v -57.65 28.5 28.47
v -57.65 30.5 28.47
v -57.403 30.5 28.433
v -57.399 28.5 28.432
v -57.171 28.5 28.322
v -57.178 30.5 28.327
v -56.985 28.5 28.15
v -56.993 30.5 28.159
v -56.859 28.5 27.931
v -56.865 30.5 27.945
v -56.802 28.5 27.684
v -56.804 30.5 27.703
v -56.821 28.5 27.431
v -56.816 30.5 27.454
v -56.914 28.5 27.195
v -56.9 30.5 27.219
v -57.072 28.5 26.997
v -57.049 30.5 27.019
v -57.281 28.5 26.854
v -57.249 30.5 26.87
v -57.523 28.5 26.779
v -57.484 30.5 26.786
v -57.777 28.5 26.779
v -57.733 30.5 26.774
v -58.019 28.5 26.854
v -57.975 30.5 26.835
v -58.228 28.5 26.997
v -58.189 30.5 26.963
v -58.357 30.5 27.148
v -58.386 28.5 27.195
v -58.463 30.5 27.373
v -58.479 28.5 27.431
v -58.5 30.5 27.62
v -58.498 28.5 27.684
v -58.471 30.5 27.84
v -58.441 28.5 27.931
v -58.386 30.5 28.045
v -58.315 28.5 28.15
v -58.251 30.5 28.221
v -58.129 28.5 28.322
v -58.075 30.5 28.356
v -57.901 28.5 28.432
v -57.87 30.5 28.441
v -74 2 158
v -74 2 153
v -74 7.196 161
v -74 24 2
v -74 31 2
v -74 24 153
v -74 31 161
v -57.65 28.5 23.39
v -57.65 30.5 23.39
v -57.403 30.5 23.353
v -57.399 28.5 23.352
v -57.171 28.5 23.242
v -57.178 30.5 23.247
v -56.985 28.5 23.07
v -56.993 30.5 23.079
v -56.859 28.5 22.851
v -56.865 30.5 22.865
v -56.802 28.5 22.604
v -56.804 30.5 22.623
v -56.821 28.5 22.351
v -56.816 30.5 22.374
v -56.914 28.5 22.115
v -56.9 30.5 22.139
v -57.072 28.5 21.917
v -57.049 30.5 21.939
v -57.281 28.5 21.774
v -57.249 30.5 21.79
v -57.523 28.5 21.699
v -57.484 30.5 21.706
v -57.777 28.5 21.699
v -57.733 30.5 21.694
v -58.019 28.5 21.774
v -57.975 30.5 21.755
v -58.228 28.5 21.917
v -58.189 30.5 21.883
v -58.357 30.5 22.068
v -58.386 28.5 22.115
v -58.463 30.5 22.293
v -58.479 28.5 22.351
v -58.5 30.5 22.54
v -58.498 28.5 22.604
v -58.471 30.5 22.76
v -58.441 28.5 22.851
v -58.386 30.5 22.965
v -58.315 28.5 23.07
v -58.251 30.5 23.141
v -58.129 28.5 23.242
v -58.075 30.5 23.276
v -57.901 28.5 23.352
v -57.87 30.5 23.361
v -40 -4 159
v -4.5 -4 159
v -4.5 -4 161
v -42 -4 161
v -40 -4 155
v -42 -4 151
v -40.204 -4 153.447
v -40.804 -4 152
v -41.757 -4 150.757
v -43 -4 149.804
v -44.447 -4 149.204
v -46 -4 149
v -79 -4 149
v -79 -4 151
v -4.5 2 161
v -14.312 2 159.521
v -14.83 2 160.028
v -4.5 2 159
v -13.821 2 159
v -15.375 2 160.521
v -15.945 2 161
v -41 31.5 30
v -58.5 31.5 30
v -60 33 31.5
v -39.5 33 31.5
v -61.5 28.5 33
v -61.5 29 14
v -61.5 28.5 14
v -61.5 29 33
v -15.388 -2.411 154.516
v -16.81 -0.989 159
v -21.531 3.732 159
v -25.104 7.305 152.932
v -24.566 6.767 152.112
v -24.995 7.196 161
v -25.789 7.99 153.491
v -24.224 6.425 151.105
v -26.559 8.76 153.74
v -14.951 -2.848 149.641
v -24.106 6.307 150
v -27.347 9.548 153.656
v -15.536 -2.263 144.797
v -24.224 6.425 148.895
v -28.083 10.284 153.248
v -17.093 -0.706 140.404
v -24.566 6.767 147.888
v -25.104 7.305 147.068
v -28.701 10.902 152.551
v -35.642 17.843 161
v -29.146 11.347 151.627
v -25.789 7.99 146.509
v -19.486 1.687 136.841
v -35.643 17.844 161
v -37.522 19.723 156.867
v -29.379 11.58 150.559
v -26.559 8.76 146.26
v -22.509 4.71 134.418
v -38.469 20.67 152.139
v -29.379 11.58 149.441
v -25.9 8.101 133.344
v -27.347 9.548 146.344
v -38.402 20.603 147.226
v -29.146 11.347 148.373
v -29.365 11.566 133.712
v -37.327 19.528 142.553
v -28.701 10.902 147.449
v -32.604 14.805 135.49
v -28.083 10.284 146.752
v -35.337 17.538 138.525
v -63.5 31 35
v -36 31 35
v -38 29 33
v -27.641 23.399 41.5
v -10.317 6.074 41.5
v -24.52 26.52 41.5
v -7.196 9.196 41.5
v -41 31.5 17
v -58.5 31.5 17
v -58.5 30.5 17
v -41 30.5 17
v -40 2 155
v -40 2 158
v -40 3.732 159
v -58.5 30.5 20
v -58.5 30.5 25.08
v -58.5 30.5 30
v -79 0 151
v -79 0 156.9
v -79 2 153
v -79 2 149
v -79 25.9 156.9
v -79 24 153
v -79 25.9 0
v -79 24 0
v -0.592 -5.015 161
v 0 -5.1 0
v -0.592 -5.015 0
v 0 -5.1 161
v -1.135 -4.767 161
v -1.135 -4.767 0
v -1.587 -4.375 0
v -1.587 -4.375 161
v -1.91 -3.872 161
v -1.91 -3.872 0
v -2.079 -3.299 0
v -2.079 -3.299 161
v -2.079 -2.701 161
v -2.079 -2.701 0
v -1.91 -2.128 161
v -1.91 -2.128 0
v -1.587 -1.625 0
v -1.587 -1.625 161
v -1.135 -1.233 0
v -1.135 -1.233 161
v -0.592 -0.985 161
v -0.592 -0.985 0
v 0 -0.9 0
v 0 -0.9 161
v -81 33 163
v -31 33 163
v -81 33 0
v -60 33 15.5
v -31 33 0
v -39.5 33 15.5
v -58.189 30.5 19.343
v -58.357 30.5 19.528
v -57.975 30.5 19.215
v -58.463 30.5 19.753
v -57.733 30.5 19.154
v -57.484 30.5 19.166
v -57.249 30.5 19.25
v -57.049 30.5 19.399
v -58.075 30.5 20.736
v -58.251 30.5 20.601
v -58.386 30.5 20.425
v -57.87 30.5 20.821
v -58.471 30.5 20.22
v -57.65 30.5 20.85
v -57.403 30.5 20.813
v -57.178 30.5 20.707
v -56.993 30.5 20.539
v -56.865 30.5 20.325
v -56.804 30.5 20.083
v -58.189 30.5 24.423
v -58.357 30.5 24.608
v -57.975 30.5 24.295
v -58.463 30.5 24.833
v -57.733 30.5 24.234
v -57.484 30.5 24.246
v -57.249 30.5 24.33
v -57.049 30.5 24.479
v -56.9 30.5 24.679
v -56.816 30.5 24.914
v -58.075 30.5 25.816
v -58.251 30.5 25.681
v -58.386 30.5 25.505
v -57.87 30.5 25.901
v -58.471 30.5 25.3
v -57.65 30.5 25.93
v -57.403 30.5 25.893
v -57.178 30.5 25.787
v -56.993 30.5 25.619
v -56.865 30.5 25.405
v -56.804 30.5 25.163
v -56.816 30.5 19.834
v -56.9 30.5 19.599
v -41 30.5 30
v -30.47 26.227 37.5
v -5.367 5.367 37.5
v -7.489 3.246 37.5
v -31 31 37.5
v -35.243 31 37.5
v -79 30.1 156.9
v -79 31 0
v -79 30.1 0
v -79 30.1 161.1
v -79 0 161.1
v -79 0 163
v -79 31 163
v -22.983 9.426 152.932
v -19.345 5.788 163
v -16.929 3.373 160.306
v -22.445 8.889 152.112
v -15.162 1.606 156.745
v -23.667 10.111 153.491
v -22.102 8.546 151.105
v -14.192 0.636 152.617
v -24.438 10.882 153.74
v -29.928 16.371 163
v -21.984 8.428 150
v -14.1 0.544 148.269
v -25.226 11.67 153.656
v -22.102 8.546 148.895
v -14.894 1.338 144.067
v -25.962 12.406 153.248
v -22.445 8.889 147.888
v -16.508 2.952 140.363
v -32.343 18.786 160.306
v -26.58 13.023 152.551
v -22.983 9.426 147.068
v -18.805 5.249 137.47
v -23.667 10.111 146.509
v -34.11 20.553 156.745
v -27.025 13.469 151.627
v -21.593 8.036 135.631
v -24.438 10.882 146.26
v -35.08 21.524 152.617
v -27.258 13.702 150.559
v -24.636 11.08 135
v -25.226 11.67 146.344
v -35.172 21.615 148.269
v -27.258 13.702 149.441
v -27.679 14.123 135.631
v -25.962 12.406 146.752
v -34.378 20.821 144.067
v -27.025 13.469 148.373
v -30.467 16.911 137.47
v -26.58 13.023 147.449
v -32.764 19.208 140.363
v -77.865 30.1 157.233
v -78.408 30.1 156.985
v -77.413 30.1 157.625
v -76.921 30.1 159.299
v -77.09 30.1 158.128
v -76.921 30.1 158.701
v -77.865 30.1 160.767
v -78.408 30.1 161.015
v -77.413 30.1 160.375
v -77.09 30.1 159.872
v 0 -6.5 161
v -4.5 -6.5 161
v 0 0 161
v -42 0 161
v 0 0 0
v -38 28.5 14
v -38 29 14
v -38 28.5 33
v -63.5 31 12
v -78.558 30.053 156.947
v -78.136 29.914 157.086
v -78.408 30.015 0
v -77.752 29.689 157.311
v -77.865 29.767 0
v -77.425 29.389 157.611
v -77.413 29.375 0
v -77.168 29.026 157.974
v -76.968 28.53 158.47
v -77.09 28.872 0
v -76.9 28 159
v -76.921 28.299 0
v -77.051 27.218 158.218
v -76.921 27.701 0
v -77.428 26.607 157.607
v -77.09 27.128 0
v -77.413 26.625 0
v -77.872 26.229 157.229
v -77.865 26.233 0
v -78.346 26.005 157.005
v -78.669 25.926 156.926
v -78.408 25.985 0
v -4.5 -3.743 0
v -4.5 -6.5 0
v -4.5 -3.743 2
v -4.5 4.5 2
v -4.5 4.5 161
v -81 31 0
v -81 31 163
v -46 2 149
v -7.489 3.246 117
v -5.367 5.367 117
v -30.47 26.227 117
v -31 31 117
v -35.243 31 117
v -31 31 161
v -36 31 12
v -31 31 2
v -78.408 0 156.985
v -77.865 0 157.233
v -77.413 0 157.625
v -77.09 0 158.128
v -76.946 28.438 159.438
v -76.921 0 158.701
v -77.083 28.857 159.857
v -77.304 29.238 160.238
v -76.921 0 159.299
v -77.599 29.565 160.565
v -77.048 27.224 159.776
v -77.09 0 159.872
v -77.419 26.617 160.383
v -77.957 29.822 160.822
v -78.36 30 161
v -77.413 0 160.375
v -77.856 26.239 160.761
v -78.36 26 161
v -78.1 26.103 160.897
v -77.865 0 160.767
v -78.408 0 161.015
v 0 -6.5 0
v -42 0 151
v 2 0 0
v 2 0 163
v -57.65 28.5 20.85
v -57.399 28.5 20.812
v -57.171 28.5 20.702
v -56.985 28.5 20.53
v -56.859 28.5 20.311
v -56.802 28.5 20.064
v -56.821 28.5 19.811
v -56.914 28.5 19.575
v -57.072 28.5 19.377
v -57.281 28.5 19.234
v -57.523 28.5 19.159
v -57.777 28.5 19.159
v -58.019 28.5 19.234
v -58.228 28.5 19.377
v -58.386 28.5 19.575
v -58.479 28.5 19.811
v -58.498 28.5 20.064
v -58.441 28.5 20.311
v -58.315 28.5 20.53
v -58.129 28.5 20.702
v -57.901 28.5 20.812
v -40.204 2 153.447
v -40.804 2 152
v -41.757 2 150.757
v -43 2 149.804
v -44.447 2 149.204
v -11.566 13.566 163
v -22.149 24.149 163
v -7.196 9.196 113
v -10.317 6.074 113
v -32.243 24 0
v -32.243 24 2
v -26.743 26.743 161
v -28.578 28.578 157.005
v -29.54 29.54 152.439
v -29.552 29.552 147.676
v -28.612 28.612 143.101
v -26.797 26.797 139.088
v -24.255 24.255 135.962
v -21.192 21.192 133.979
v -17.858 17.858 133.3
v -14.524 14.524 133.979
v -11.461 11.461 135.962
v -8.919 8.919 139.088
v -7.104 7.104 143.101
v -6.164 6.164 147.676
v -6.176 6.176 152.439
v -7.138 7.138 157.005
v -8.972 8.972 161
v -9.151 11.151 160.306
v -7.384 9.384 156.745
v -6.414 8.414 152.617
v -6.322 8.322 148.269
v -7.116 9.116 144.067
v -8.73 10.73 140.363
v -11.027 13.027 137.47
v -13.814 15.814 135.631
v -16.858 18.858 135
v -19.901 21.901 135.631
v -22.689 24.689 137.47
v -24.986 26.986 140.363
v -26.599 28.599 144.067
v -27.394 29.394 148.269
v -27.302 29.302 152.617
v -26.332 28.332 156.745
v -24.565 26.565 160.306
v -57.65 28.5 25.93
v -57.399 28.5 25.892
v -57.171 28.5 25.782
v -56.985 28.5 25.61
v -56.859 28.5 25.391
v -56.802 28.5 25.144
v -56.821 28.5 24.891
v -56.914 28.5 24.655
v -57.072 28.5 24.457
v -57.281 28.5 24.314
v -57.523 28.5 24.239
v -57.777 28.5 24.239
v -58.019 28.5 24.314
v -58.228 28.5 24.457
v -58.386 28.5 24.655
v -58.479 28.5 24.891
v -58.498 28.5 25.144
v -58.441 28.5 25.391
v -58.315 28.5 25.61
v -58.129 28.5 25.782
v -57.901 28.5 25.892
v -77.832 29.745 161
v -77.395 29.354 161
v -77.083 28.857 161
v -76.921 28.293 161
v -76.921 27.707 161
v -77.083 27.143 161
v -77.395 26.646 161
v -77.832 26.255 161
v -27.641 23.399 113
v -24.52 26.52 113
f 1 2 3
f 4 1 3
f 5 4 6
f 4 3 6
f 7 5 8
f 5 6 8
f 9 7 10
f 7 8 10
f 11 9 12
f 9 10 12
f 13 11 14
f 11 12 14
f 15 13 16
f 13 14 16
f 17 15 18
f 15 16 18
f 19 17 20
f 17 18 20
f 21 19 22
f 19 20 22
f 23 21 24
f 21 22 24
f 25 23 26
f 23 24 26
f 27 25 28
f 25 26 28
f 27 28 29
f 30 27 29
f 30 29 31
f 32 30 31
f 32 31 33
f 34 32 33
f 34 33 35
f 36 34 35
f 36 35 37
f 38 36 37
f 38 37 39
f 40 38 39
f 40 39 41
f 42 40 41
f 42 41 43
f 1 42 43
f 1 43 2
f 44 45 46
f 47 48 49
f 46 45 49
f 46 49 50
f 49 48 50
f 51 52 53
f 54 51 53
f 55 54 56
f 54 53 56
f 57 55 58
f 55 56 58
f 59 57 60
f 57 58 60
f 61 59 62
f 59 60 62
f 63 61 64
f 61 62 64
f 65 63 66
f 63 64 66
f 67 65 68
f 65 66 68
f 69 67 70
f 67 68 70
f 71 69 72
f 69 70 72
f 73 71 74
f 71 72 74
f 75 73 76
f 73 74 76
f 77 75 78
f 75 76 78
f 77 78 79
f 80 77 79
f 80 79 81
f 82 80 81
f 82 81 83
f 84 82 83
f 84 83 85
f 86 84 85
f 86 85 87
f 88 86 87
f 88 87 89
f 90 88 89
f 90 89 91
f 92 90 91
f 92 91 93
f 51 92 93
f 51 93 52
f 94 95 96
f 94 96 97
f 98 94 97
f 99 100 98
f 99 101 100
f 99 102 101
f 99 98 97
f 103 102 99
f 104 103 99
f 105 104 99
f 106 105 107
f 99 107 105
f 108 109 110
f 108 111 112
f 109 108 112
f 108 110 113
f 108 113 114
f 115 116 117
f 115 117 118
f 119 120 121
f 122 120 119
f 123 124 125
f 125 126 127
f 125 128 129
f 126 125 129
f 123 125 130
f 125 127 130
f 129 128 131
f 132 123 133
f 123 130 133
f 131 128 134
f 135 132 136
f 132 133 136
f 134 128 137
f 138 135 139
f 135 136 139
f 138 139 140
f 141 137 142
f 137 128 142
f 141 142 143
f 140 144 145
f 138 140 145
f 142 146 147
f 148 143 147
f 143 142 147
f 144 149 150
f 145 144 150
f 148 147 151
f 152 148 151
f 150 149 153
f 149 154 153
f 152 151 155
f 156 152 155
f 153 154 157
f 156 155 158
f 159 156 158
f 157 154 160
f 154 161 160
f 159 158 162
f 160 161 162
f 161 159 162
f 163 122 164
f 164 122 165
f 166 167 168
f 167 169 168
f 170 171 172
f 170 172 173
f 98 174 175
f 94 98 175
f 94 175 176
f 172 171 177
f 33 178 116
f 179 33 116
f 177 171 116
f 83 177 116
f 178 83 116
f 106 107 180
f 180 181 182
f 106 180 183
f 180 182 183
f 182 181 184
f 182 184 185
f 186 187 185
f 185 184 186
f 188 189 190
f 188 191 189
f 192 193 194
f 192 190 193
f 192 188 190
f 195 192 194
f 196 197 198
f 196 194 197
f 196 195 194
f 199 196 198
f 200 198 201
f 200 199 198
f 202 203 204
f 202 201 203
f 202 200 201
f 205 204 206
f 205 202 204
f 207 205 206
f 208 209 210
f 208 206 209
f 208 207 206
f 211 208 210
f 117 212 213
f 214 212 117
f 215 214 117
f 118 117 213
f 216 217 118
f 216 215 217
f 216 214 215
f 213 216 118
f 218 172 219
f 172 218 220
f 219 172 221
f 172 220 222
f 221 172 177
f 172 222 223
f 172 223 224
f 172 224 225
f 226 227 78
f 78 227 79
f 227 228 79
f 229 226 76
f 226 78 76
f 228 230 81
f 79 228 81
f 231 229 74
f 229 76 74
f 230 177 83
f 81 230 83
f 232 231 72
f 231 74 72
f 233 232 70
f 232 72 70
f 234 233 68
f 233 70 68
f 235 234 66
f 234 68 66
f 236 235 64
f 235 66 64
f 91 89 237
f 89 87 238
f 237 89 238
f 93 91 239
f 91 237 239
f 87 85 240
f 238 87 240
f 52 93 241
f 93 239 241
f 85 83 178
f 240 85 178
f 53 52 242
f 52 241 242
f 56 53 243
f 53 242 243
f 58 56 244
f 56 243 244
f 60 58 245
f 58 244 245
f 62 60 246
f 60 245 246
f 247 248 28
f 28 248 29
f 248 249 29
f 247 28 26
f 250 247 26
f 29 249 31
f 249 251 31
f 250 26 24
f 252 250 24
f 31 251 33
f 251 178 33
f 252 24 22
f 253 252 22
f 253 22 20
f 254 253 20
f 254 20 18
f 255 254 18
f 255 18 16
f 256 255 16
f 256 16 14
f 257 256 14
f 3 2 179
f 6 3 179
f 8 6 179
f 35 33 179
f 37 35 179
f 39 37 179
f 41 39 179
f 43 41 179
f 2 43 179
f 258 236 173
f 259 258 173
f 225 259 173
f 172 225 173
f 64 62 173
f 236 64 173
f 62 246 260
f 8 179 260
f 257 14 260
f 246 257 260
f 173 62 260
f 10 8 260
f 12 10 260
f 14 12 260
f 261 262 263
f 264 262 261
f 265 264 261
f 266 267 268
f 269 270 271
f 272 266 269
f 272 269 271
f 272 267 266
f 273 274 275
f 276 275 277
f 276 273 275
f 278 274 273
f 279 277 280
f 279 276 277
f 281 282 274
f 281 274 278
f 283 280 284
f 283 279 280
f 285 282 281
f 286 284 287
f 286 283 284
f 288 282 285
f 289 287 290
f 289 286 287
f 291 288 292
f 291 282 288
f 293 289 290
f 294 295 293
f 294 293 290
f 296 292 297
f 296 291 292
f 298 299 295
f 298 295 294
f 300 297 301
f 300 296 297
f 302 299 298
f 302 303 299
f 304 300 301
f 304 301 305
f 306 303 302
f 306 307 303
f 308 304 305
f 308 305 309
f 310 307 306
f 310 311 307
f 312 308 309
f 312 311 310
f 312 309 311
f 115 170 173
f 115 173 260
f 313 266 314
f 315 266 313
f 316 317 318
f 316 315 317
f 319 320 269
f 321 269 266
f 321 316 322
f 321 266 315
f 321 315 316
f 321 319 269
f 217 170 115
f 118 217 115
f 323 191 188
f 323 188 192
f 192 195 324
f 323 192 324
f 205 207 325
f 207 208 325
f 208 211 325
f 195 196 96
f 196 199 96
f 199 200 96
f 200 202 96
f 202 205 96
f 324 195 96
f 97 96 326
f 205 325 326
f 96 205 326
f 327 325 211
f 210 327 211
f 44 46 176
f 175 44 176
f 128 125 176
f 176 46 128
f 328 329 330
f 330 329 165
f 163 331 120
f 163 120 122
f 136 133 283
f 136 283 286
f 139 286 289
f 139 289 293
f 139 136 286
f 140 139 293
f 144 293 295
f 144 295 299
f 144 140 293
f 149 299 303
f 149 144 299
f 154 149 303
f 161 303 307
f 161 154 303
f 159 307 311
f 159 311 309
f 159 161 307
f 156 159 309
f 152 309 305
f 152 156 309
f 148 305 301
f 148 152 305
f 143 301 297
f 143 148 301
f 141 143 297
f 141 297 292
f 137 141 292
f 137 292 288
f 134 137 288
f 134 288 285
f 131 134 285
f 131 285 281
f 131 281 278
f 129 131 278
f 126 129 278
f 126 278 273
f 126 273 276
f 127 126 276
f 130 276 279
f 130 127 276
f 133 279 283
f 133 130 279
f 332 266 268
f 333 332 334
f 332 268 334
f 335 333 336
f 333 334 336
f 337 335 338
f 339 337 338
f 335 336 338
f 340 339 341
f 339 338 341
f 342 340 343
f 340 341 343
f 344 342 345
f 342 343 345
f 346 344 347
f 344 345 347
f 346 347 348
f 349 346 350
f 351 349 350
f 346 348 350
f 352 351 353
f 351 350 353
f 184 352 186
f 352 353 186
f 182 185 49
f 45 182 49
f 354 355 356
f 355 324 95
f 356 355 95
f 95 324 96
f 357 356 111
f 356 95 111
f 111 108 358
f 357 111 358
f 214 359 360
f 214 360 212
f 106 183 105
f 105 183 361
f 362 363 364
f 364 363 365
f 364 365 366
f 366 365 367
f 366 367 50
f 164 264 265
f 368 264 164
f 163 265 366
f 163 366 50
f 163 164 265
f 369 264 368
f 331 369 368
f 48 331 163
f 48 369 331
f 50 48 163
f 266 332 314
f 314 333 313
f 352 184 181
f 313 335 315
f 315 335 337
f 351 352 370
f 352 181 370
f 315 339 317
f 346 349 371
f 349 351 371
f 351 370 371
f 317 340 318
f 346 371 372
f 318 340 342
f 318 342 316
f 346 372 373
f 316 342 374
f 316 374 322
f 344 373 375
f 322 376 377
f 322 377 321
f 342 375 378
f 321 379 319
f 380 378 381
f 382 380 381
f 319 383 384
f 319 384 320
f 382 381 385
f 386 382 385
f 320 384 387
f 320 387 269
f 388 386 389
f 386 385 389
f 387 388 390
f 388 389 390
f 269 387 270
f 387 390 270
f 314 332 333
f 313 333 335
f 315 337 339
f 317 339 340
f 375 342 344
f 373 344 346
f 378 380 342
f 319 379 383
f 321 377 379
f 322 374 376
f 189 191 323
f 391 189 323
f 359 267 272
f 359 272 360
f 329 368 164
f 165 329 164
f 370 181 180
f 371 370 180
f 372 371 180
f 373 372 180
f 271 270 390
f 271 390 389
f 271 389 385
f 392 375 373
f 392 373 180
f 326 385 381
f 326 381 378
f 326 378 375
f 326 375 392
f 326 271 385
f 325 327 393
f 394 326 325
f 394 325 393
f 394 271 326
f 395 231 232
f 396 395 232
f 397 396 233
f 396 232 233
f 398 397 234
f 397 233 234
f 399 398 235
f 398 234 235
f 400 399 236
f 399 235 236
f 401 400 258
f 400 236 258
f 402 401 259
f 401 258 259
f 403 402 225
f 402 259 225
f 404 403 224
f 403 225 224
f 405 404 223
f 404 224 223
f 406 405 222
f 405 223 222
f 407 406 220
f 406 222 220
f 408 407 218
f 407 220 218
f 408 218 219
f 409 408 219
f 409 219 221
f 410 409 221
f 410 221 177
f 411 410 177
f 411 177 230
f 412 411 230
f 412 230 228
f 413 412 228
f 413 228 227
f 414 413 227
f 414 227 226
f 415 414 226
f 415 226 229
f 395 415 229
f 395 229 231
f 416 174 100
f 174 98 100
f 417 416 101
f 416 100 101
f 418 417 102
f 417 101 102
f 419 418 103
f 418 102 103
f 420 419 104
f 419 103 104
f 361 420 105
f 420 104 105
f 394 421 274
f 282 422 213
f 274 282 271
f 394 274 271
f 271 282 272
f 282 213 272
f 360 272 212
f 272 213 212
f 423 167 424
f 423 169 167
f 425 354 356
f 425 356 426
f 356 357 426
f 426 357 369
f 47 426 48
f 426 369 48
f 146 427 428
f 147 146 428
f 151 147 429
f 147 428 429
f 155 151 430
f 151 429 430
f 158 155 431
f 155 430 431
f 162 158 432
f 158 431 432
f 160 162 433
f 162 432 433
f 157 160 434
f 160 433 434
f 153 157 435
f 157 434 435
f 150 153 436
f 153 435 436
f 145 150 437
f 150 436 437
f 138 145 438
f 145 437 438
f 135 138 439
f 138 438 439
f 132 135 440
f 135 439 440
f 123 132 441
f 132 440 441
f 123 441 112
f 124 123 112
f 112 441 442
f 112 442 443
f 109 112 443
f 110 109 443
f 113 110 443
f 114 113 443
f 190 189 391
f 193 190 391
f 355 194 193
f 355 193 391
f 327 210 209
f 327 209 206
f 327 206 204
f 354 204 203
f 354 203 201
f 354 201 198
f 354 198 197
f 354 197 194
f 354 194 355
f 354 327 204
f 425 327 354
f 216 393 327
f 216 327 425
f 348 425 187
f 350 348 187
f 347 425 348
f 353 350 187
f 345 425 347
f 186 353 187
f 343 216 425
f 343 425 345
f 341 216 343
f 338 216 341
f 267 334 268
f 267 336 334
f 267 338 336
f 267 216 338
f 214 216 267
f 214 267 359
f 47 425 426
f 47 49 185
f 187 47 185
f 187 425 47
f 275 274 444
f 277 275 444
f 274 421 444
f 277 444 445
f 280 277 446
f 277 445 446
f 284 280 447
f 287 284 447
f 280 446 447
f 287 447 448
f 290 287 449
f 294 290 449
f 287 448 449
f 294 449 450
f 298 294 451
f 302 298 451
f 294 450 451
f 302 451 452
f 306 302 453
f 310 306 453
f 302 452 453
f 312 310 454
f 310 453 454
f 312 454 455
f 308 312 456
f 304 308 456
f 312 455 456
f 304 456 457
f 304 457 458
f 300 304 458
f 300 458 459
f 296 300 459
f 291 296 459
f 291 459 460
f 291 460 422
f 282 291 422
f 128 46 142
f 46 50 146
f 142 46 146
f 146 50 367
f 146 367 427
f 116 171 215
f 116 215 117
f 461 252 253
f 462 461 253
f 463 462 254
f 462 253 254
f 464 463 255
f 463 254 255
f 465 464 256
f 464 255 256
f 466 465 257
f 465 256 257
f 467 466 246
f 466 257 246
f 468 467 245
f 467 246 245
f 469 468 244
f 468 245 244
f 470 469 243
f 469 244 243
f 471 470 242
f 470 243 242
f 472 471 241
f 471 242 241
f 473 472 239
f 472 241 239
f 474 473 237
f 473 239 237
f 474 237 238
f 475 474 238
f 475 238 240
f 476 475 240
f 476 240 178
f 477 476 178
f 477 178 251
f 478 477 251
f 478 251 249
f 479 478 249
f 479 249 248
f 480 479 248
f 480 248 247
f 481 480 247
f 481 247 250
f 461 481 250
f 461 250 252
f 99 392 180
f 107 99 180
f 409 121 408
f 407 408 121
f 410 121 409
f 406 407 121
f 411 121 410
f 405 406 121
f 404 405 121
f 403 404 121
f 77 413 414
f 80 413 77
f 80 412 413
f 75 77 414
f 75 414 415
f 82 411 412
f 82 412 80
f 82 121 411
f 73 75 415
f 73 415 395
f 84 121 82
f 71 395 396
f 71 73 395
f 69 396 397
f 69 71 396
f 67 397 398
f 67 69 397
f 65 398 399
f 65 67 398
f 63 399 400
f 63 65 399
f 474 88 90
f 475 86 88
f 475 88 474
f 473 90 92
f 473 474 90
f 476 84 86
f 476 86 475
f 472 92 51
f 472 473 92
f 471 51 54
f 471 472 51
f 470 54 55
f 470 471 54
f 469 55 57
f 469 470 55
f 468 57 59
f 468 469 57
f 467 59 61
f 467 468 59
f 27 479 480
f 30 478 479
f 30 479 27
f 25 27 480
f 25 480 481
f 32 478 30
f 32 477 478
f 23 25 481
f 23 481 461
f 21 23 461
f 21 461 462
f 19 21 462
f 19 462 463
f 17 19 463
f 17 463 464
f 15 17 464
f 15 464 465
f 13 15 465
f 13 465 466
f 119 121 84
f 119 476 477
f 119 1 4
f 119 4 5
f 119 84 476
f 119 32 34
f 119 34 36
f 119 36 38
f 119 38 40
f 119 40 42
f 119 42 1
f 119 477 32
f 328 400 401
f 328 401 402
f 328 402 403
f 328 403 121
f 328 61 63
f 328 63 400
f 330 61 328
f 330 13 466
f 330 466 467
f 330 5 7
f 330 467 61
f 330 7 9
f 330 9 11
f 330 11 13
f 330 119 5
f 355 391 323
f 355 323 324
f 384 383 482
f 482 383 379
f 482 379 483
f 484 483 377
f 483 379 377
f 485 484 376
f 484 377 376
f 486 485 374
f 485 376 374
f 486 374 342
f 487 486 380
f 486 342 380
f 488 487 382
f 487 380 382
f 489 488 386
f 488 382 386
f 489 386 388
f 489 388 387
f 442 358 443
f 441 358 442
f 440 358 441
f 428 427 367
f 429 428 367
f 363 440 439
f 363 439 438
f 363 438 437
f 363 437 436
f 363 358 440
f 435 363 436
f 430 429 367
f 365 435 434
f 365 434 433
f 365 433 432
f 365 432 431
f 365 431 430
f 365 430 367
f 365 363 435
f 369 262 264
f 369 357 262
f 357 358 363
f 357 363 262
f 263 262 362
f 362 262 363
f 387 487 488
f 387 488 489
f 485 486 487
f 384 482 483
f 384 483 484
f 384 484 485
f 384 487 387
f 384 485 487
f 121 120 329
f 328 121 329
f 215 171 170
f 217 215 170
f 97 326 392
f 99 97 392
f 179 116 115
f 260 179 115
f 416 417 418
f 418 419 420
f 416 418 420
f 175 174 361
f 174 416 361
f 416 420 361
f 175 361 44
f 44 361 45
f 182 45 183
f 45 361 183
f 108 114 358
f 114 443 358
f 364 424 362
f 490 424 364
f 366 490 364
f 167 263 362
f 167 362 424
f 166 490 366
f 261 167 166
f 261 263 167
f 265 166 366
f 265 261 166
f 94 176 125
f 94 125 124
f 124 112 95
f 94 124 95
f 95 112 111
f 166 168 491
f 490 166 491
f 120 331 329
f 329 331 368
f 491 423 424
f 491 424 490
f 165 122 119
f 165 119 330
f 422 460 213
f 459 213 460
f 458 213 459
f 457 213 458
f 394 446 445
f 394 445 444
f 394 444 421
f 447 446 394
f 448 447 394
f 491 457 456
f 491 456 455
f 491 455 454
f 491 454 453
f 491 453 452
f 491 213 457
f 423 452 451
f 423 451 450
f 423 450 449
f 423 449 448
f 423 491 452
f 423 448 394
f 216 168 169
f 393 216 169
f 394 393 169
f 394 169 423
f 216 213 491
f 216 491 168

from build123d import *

# Parameters (mm, degrees)
EXTRUDE_1_DEPTH          = 163
EXTRUDE_2_DEPTH          = 2
EXTRUDE_3_DEPTH          = 2
SKETCH_4_W               = 37
SKETCH_4_H               = 10
EXTRUDE_4_DEPTH          = 2
SKETCH_5_W               = 71.5
SKETCH_5_H               = 24.5
CUT_EXTRUDE_1_DEPTH      = 186.248481775
SKETCH_6_W               = 79.5
SKETCH_6_H               = 32.5
SKETCH_6_W_2             = 71.5
SKETCH_6_H_2             = 24.5
EXTRUDE_5_DEPTH          = 3
EXTRUDE_6_DEPTH          = 79.5
SKETCH_10_R              = 15
CUT_EXTRUDE_2_DEPTH      = 14
EXTRUDE_8_DEPTH          = 14
SKETCH_12_R              = 3.75
EXTRUDE_9_DEPTH          = 3
CUT_EXTRUDE_3_DEPTH      = 186.137402806
CUT_EXTRUDE_3_DEPTH_BACK = 186.137402806
SKETCH_14_W              = 17.5
SKETCH_14_H              = 13
SKETCH_15_W              = 23.5
SKETCH_15_H              = 19
SKETCH_15_W_2            = 17.5
SKETCH_15_H_2            = 13
EXTRUDE_10_DEPTH         = 0.5
SKETCH_16_W              = 23.5
SKETCH_16_H              = 19
EXTRUDE_11_DEPTH         = 2
CHAMFER_2_SIZE           = 2
CHAMFER_3_SIZE           = 1.5
SKETCH_17_R              = 0.85
CUT_EXTRUDE_4_DEPTH      = 10
SKETCH_18_W              = 5
SKETCH_18_H              = 7
EXTRUDE_12_DEPTH         = 161
SKETCH_19_R              = 2.1
CUT_EXTRUDE_5_DEPTH      = 161
SKETCH_20_W              = 5
SKETCH_20_H              = 8
EXTRUDE_13_DEPTH         = 22
SKETCH_21_R              = 2.1
CUT_EXTRUDE_6_DEPTH      = 30.1
EXTRUDE_14_DEPTH         = 161
CUT_EXTRUDE_7_DEPTH      = 185.983783073
CUT_EXTRUDE_7_DEPTH_BACK = 185.983783073
SKETCH_23_R              = 2.1
EXTRUDE_15_DEPTH         = 2
EXTRUDE_16_DEPTH         = 6
FILLET_1_R               = 6
CHAMFER_5_SIZE           = 3
CHAMFER_5_SIZE2          = 5.196152423


with BuildPart() as part:
    # Эскиз1 → Бобышка-Вытянуть1 (new body)
    with BuildSketch(Plane.XY):
        Polygon((0, 0), (-31, 31), (-81, 31), (-81, 33), (-31, 33), (2, 0), align=None)
    extrude(amount=EXTRUDE_1_DEPTH)

    # Эскиз2 → Бобышка-Вытянуть2 (add)
    with BuildSketch(Plane.XY.offset(163)):
        Polygon((2, 0), (-31, 33), (-79, 33), (-79, 0), align=None)
    extrude(amount=-EXTRUDE_2_DEPTH)

    # Эскиз3 → Бобышка-Вытянуть3 (add)
    with BuildSketch(Plane(origin=(0, 0, 0), x_dir=(-1, 0, 0), z_dir=(0, 0, -1))):
        Polygon((0, 0), (31, 31), (79, 31), (79, 28), (32.242640687, 28), (4.242640687, 0), align=None)
    extrude(amount=-EXTRUDE_3_DEPTH)

    # Эскиз4 → Бобышка-Вытянуть4 (add)
    with BuildSketch(Plane.XZ):
        with Locations((-60.5, 156)):
            Rectangle(SKETCH_4_W, SKETCH_4_H)
    extrude(amount=-EXTRUDE_4_DEPTH)

    # Эскиз5 → Вырез-Вытянуть1 (cut, through all)
    with BuildSketch(Plane(origin=(1, 1, 0), x_dir=(0, 0, -1), z_dir=(0.7071067811865461, 0.7071067811865489, 0))):
        with Locations((-77.25, 23.840620434)):
            Rectangle(SKETCH_5_W, SKETCH_5_H)
    extrude(amount=-CUT_EXTRUDE_1_DEPTH, mode=Mode.SUBTRACT)

    # Эскиз6 → Бобышка-Вытянуть5 (add)
    with BuildSketch(Plane(origin=(0, 0, 0), x_dir=(0, 0, 1), z_dir=(-0.7071067811865462, -0.7071067811865489, 0))):
        with Locations((77.25, 23.840620434)):
            Rectangle(SKETCH_6_W, SKETCH_6_H)
        with Locations((77.25, 23.840620434)):
            Rectangle(SKETCH_6_W_2, SKETCH_6_H_2, mode=Mode.SUBTRACT)
    extrude(amount=EXTRUDE_5_DEPTH)

    # Эскиз8 → Бобышка-Вытянуть6 (add)
    with BuildSketch(Plane(origin=(0, 0, 37.5), x_dir=(-1, 0, 0), z_dir=(0, 0, -1))):
        Polygon((28.348349571, 28.348349571), (30.469669914, 26.227029227), (35.242640687, 31), (31, 31), align=None)
    extrude(amount=-EXTRUDE_6_DEPTH)

    # Эскиз10 → Вырез-Вытянуть2 (cut)
    with BuildSketch(Plane(origin=(1, 1, 0), x_dir=(0, 0, -1), z_dir=(0.7071067811865461, 0.7071067811865489, 0))):
        with Locations((-150, 25.254833996)):
            Circle(SKETCH_10_R)
    extrude(amount=-CUT_EXTRUDE_2_DEPTH, mode=Mode.SUBTRACT)

    # Эскиз11 → Бобышка-Вытянуть8 (add)
    with BuildSketch(Plane(origin=(1, 1, 0), x_dir=(0, 0, -1), z_dir=(0.7071067811865461, 0.7071067811865489, 0))):
        with BuildLine():
            Line((-163, 32.738148769), (-163, 35.738148769))
            ThreePointArc((-163, 35.738148769), (-133.299703936, 25.254833996), (-163, 14.771519222))
            Line((-163, 14.771519222), (-163, 17.771519222))
            ThreePointArc((-163, 17.771519222), (-135, 25.254833996), (-163, 32.738148769))
        make_face()
    extrude(amount=-EXTRUDE_8_DEPTH)

    # Эскиз12 → Бобышка-Вытянуть9 (add)
    with BuildSketch(Plane(origin=(-8.899494937, -8.899494937, 0), x_dir=(0, 0, -1), z_dir=(0.7071067811865461, 0.7071067811865489, 0))):
        with BuildLine():
            Line((-163, 35.737677122), (-163, 14.77199087))
            ThreePointArc((-163, 14.77199087), (-133.3, 25.254833996), (-163, 35.737677122))
        make_face()
        with Locations(Location((-150, 25.254833996, 0), (0, 0, 270))):
            Circle(SKETCH_12_R, mode=Mode.SUBTRACT)
    extrude(amount=EXTRUDE_9_DEPTH)

    # Эскиз14 → Вырез-Вытянуть3 (cut, two sides: drawn at the far end of the back side and taken through both)
    with BuildSketch(Plane.XZ.offset(-31).offset(-CUT_EXTRUDE_3_DEPTH_BACK)):
        with Locations((-49.75, 23.5)):
            Rectangle(SKETCH_14_W, SKETCH_14_H)
    extrude(amount=CUT_EXTRUDE_3_DEPTH + CUT_EXTRUDE_3_DEPTH_BACK, mode=Mode.SUBTRACT)

    # Эскиз15 → Бобышка-Вытянуть10 (add)
    with BuildSketch(Plane.XZ.offset(-31)):
        with Locations((-49.75, 23.5)):
            Rectangle(SKETCH_15_W, SKETCH_15_H)
        with Locations((-49.75, 23.5)):
            Rectangle(SKETCH_15_W_2, SKETCH_15_H_2, mode=Mode.SUBTRACT)
    extrude(amount=EXTRUDE_10_DEPTH)

    # Эскиз16 → Бобышка-Вытянуть11 (add)
    with BuildSketch(Plane.XZ.offset(-30.5)):
        with Locations((-49.75, 23.5)):
            Rectangle(SKETCH_16_W, SKETCH_16_H)
    extrude(amount=EXTRUDE_11_DEPTH)

    # Фаска2
    chamfer_2_edges = [part.edges().sort_by_distance(p)[0] for p in [
        (-38, 31, 23.5),
        (-49.75, 31, 33),
        (-61.5, 31, 23.5),
        (-49.75, 31, 14),
    ]]
    chamfer(chamfer_2_edges, length=CHAMFER_2_SIZE)

    # Фаска3
    chamfer_3_edges = [part.edges().sort_by_distance(p)[0] for p in [
        (-41, 33, 23.5),
        (-49.75, 33, 17),
        (-58.5, 33, 23.5),
        (-49.75, 33, 30),
    ]]
    chamfer(chamfer_3_edges, length=CHAMFER_3_SIZE)

    # Эскиз17 → Вырез-Вытянуть4 (cut)
    with BuildSketch(Plane(origin=(0, 30.5, 0), x_dir=(1, 0, 0), z_dir=(0, 1, 0))):
        with Locations(Location((-57.65, -20, 0), (0, 0, 270))):
            Circle(SKETCH_17_R)
        with Locations(Location((-57.65, -22.54, 0), (0, 0, 270))):
            Circle(SKETCH_17_R)
        with Locations(Location((-57.65, -25.08, 0), (0, 0, 270))):
            Circle(SKETCH_17_R)
        with Locations(Location((-57.65, -27.62, 0), (0, 0, 270))):
            Circle(SKETCH_17_R)
    extrude(amount=-CUT_EXTRUDE_4_DEPTH, mode=Mode.SUBTRACT)

    # Эскиз18 → Бобышка-Вытянуть12 (add)
    with BuildSketch(Plane(origin=(0, 0, 161), x_dir=(-1, 0, 0), z_dir=(0, 0, -1))):
        with Locations((76.5, 27.5)):
            Rectangle(SKETCH_18_W, SKETCH_18_H)
    extrude(amount=EXTRUDE_12_DEPTH)

    # Эскиз19 → Вырез-Вытянуть5 (cut)
    with BuildSketch(Plane(origin=(0, 0, 0), x_dir=(-1, 0, 0), z_dir=(0, 0, -1))):
        with Locations((79, 28)):
            Circle(SKETCH_19_R)
    extrude(amount=-CUT_EXTRUDE_5_DEPTH, mode=Mode.SUBTRACT)

    # Эскиз20 → Бобышка-Вытянуть13 (add)
    with BuildSketch(Plane.XZ.offset(-24)):
        with Locations((-76.5, 157)):
            Rectangle(SKETCH_20_W, SKETCH_20_H)
    extrude(amount=EXTRUDE_13_DEPTH)

    # Эскиз21 → Вырез-Вытянуть6 (cut)
    with BuildSketch(Plane.XZ):
        with Locations((-79, 159)):
            Circle(SKETCH_21_R)
    extrude(amount=-CUT_EXTRUDE_6_DEPTH, mode=Mode.SUBTRACT)

    # Эскиз22 → Бобышка-Вытянуть14 (add)
    with BuildSketch(Plane(origin=(0, 0, 161), x_dir=(-1, 0, 0), z_dir=(0, 0, -1))):
        Polygon((4.5, -1.5), (4.5, 4.5), (0, 0), (0, -6.5), (4.5, -6.5), align=None)
    extrude(amount=EXTRUDE_14_DEPTH)

    # Эскиз23 → Вырез-Вытянуть7 (cut, two sides: drawn at the far end of the back side and taken through both)
    with BuildSketch(Plane(origin=(0, 0, 0), x_dir=(-1, 0, 0), z_dir=(0, 0, -1)).offset(-CUT_EXTRUDE_7_DEPTH_BACK)):
        with Locations((0, -3)):
            Circle(SKETCH_23_R)
    extrude(amount=CUT_EXTRUDE_7_DEPTH + CUT_EXTRUDE_7_DEPTH_BACK, mode=Mode.SUBTRACT)

    # Эскиз24 → Бобышка-Вытянуть15 (add)
    with BuildSketch(Plane(origin=(0, 0, 0), x_dir=(-1, 0, 0), z_dir=(0, 0, -1))):
        Polygon((74, 24), (74, 28), (32.242640687, 28), (4.5, 0.257359313), (4.5, -3.742640687), (32.242640687, 24), align=None)
    extrude(amount=-EXTRUDE_15_DEPTH)

    # Эскиз25 → Бобышка-Вытянуть16 (add)
    with BuildSketch(Plane(origin=(0, 2, 0), x_dir=(1, 0, 0), z_dir=(0, 1, 0))):
        Polygon((-42, -151), (-79, -151), (-79, -149), (-40, -149), (-40, -159), (-4.5, -159), (-4.5, -161), (-42, -161), align=None)
    extrude(amount=-EXTRUDE_16_DEPTH)

    # Скругление1
    fillet_1_edges = [part.edges().sort_by_distance(p)[0] for p in [
        (-40, -1, 149),
    ]]
    fillet(fillet_1_edges, radius=FILLET_1_R)

    # Фаска5
    chamfer_5_edges = [part.edges().sort_by_distance(p)[0] for p in [
        (-46.899494937, 2, 161),
    ]]
    chamfer_5_side = [part.faces().sort_by_distance(p)[0] for p in [
        (-55.732444542, 2, 155.342995901),
    ]]
    chamfer(chamfer_5_edges, length=CHAMFER_5_SIZE, length2=CHAMFER_5_SIZE2, reference=chamfer_5_side[0])


solid = part.part
